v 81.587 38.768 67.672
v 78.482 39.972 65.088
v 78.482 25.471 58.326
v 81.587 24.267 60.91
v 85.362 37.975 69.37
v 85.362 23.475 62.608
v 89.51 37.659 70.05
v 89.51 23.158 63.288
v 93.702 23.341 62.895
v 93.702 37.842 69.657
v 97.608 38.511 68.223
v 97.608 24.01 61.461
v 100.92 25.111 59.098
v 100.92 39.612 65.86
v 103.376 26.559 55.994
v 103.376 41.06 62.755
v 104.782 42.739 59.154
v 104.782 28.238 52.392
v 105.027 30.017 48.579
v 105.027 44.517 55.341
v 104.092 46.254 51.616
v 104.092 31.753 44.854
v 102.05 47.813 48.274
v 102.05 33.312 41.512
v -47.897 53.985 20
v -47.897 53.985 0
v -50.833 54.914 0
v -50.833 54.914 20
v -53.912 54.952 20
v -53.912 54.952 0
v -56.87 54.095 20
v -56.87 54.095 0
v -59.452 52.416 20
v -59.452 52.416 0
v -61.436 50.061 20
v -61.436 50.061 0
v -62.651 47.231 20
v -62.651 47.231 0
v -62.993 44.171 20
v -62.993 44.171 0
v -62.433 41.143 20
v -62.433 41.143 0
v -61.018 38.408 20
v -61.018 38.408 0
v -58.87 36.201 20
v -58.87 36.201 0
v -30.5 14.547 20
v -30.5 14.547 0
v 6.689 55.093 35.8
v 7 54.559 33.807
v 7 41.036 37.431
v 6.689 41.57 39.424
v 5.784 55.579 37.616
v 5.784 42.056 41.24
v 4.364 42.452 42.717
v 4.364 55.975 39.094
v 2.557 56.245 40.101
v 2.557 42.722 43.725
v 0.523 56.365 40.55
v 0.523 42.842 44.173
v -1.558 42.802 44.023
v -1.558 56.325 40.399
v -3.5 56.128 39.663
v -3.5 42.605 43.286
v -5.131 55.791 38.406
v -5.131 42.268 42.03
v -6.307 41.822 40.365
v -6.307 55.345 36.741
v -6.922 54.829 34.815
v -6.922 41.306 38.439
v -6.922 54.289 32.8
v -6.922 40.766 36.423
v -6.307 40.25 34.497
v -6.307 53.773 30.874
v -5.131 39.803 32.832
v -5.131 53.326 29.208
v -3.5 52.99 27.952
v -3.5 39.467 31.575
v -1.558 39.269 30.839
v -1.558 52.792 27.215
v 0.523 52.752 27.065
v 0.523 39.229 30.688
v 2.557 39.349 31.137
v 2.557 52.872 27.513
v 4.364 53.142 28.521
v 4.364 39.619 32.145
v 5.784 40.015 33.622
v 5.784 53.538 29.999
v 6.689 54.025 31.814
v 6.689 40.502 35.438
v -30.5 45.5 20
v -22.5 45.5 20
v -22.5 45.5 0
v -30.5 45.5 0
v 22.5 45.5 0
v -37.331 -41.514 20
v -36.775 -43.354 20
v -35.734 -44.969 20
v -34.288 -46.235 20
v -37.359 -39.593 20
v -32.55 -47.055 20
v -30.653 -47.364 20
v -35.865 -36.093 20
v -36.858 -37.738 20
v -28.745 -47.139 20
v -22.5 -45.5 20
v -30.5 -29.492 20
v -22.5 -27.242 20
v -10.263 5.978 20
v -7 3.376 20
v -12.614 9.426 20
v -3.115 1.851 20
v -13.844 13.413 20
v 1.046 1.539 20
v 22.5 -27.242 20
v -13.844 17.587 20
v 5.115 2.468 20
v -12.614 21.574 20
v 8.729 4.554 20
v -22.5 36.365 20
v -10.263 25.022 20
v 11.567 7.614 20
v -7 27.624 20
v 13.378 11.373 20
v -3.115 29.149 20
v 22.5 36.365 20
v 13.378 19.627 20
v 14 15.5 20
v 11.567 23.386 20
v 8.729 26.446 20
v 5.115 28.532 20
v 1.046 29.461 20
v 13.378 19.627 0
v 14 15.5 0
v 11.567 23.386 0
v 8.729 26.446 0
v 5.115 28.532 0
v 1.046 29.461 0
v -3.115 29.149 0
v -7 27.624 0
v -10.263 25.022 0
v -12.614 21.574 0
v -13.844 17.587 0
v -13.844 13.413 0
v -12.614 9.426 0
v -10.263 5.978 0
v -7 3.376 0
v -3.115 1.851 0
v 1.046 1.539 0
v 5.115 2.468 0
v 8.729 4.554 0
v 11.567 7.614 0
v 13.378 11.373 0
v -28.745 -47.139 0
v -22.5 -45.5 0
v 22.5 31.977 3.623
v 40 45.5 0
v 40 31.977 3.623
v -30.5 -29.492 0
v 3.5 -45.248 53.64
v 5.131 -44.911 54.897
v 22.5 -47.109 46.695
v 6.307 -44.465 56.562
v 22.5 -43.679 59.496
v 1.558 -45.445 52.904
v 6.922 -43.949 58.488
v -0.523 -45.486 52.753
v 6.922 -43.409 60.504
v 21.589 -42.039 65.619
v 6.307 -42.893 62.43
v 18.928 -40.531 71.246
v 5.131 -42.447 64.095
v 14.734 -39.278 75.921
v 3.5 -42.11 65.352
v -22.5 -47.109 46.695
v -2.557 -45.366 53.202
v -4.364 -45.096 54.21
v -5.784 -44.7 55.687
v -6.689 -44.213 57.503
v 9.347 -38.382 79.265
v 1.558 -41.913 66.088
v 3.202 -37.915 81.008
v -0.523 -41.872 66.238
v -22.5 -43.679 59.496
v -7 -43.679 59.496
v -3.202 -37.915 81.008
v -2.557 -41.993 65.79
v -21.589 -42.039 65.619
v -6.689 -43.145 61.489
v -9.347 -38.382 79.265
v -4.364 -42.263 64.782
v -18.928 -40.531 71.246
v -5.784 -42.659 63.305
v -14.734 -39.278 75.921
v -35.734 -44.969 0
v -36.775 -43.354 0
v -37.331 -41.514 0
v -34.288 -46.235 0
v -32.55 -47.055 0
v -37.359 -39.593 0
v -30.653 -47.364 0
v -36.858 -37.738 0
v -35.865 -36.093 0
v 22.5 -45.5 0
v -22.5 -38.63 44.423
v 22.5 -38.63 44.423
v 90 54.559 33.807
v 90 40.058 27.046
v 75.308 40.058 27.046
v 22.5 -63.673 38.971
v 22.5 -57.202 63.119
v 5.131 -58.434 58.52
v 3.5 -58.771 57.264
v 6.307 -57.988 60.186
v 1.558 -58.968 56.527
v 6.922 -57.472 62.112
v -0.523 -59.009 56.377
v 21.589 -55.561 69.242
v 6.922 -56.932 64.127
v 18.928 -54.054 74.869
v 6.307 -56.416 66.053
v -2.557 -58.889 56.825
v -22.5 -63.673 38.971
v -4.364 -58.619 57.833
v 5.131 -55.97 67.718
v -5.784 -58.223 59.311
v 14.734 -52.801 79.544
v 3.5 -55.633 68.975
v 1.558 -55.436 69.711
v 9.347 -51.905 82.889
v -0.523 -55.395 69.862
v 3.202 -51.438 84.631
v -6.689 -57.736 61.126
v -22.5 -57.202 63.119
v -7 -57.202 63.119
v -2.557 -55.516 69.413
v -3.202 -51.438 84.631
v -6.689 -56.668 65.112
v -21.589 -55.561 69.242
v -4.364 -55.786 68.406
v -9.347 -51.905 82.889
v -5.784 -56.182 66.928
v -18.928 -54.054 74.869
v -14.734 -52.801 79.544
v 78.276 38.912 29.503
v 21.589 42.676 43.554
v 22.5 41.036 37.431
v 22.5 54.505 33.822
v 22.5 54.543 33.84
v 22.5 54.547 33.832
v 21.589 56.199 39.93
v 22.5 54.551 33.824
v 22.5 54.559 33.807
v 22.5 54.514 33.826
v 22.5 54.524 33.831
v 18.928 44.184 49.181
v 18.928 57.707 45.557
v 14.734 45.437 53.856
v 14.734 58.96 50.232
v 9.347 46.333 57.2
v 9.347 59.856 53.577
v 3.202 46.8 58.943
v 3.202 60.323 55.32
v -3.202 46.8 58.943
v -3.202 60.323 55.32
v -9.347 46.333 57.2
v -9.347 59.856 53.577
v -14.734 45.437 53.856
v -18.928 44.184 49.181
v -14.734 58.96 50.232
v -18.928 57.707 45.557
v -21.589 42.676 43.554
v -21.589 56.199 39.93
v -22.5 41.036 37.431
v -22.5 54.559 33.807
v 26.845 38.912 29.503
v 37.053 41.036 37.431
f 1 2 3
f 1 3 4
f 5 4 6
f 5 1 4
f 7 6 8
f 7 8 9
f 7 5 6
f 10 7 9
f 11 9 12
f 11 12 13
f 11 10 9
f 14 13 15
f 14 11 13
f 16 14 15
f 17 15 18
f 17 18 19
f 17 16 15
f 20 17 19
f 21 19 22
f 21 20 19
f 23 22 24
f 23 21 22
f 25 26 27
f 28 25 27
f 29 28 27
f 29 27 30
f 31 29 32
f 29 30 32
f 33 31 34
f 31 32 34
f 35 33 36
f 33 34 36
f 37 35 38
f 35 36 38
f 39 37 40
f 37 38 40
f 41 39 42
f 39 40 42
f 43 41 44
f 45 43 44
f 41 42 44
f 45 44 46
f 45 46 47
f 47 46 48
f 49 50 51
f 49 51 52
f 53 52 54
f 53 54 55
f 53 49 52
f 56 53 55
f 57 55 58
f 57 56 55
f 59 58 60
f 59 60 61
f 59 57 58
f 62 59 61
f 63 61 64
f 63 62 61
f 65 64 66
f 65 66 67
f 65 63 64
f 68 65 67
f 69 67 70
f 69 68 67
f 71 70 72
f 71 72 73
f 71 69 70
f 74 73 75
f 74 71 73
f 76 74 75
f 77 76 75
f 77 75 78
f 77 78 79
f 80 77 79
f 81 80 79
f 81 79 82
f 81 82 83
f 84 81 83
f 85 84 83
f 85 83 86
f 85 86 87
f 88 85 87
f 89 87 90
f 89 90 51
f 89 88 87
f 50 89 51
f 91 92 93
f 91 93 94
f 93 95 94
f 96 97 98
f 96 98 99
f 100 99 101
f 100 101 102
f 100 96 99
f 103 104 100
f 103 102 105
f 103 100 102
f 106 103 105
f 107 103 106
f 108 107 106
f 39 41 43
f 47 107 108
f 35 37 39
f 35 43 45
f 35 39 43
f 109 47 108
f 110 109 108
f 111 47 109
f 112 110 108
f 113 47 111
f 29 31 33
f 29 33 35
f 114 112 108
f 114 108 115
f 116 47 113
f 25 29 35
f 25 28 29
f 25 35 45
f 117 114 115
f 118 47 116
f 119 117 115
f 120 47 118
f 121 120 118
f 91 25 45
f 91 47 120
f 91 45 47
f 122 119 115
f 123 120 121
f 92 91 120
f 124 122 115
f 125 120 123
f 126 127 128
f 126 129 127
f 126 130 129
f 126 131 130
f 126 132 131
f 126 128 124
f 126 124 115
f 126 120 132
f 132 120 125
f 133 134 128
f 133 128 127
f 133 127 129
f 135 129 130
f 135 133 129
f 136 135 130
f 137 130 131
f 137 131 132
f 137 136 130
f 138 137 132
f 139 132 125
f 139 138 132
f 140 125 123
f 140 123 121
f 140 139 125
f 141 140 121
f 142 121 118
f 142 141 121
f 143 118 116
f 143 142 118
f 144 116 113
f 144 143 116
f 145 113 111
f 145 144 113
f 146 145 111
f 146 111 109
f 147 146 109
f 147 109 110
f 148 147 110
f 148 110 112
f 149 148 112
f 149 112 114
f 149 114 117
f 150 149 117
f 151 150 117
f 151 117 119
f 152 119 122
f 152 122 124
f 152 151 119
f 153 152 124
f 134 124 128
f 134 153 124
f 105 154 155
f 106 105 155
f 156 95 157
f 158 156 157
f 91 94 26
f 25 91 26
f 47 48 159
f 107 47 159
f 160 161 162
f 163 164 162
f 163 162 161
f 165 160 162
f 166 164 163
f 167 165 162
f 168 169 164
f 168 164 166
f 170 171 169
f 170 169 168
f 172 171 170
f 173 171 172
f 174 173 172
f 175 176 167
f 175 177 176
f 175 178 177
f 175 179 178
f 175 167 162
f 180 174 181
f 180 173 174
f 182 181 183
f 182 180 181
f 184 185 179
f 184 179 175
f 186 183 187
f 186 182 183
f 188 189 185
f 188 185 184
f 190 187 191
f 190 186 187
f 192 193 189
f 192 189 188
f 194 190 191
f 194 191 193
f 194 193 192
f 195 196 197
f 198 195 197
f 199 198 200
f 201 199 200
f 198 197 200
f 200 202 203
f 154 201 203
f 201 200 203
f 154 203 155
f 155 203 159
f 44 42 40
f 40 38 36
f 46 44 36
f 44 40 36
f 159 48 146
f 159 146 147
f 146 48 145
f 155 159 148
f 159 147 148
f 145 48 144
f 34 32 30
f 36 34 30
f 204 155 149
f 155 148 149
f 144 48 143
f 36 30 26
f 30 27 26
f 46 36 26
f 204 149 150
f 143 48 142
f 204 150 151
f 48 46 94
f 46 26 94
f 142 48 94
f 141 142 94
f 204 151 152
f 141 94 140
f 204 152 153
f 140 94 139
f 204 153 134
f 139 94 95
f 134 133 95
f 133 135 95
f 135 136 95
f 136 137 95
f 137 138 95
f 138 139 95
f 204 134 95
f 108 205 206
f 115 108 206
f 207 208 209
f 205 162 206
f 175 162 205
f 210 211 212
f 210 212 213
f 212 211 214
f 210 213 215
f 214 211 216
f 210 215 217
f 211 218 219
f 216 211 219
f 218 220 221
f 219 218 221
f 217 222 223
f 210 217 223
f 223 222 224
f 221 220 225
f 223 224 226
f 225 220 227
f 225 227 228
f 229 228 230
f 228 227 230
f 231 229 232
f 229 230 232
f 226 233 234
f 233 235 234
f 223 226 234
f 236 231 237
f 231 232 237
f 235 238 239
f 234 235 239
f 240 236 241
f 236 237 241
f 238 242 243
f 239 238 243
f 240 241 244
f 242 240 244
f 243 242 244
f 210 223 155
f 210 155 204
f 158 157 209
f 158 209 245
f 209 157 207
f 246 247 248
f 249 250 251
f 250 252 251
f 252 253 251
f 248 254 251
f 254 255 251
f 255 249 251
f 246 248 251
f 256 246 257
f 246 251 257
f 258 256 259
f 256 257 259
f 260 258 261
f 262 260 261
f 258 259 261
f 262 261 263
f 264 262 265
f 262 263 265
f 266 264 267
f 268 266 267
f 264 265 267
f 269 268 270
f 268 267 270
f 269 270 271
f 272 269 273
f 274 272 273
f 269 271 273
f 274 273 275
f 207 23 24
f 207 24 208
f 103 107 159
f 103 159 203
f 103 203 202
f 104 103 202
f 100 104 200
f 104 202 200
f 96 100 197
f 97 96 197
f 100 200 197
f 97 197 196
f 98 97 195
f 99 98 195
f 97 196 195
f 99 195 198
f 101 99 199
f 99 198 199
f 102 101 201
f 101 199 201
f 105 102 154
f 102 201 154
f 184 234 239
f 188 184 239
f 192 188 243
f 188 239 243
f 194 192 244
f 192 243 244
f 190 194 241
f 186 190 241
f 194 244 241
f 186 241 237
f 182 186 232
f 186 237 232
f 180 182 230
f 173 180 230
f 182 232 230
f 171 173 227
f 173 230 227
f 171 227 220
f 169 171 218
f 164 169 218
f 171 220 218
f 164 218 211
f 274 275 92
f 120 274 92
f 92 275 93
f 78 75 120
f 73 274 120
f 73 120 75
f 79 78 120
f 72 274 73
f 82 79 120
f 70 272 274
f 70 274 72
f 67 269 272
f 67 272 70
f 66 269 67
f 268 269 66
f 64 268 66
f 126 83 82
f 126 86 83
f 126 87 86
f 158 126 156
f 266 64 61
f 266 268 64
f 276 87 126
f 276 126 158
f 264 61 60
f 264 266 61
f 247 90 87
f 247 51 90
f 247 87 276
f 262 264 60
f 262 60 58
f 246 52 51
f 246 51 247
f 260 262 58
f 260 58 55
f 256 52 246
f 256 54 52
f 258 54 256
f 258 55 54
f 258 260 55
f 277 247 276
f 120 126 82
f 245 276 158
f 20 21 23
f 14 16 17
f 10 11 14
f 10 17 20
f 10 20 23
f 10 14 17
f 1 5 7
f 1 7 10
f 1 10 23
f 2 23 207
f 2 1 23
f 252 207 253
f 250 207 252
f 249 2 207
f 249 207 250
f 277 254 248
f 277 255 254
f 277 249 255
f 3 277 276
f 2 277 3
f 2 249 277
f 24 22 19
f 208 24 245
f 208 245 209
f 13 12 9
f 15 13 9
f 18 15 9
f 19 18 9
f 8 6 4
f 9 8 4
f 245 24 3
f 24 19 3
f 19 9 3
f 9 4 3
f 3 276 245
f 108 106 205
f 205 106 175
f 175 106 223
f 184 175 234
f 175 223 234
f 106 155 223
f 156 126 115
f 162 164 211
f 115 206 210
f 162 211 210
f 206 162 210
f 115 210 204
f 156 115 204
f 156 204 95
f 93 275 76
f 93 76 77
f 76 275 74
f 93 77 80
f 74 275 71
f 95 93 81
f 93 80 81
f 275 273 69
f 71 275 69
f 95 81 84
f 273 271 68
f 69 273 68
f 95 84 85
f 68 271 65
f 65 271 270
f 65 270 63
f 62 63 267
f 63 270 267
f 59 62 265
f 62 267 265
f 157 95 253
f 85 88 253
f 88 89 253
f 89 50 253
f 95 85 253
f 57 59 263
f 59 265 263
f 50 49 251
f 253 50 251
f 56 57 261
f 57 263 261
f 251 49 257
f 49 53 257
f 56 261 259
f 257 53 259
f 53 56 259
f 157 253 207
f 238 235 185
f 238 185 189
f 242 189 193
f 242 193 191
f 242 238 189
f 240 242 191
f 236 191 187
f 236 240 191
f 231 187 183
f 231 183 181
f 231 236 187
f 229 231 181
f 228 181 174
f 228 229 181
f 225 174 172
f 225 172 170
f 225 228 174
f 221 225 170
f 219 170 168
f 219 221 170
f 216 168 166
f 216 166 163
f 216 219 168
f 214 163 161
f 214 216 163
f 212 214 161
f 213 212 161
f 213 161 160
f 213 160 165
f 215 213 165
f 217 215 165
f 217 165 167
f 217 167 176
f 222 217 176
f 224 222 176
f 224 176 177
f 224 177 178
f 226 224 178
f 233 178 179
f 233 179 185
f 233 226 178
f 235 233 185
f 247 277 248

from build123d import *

# Parameters (mm, degrees)
F0_W       = 45
F0_H       = 91
F0_R       = 14
F1_DEPTH   = 20
F3_R       = 7
F4_DEPTH   = 14
F7_DEPTH   = 16
F9_W       = 45
F9_H       = 43
F10_DEPTH  = 25
F12_R      = 7
F13_DEPTH  = 14
F13_FACE_R = 7
F14_DEPTH  = 15.248435


with BuildPart() as f1:
    # F0 (on Top) → F1 (new body)
    with BuildSketch(Plane.XY):
        with BuildLine():
            Line((-30.5, 14.547375), (-30.5, 45.5))
            Line((-30.5, 45.5), (-47.897288, 53.984803))
            ThreePointArc((-47.897288, 53.984803), (-43.595549, 50.111615), (-42, 44.547375))
            ThreePointArc((-42, 44.547375), (-47.84382, 35.136212), (-58.870473, 36.200695))
            Line((-58.870473, 36.200695), (-30.5, 14.547375))
        make_face()
        with BuildLine():
            ThreePointArc((-42, 44.547375), (-43.595549, 50.111615), (-47.897288, 53.984803))
            ThreePointArc((-47.897288, 53.984803), (-61.435875, 50.061007), (-58.870473, 36.200695))
            ThreePointArc((-58.870473, 36.200695), (-47.84382, 35.136212), (-42, 44.547375))
        make_face()
        Rectangle(F0_W, F0_H)
        with Locations((0, 15.5)):
            Circle(F0_R, mode=Mode.SUBTRACT)
        with BuildLine():
            Line((-22.5, -45.5), (-22.5, 45.5))
            Line((-22.5, 45.5), (-30.5, 45.5))
            Line((-30.5, 45.5), (-30.5, 14.547375))
            Line((-30.5, 14.547375), (-30.5, -29.491527))
            Line((-30.5, -29.491527), (-30.5, -33.539497))
            ThreePointArc((-30.5, -33.539497), (-25.61168, -35.564305), (-23.586872, -40.452625))
            ThreePointArc((-23.586872, -40.452625), (-25.026188, -44.675033), (-28.744805, -47.139226))
            Line((-28.744805, -47.139226), (-22.5, -45.5))
        make_face()
        with BuildLine():
            ThreePointArc((-35.864791, -36.092538), (-36.310734, -44.197851), (-28.744805, -47.139226))
            ThreePointArc((-28.744805, -47.139226), (-25.026188, -44.675033), (-23.586872, -40.452625))
            ThreePointArc((-23.586872, -40.452625), (-25.61168, -35.564305), (-30.5, -33.539497))
            ThreePointArc((-30.5, -33.539497), (-33.470648, -34.210302), (-35.864791, -36.092538))
        make_face()
        with BuildLine():
            Line((-30.5, -29.491527), (-35.864791, -36.092538))
            ThreePointArc((-35.864791, -36.092538), (-33.470648, -34.210302), (-30.5, -33.539497))
            Line((-30.5, -33.539497), (-30.5, -29.491527))
        make_face()
    extrude(amount=F1_DEPTH)

    # F3 (on face) → F4 (join)
    with BuildSketch(Plane(origin=(0, 42.452078, -11.375), x_dir=(1, 0, 0), z_dir=(0, -0.965926, 0.258819))):
        with BuildLine():
            ThreePointArc((-22.5, 46.776267), (0, 24.276267), (22.5, 46.776267))
            ThreePointArc((22.5, 46.776267), (0, 69.276267), (-22.5, 46.776267))
        make_face()
        with Locations((0, 46.776267)):
            Circle(F3_R, mode=Mode.SUBTRACT)
        with BuildLine():
            Line((22.5, 11.776267), (22.5, 46.776267))
            ThreePointArc((22.5, 46.776267), (0, 24.276267), (-22.5, 46.776267))
            Line((-22.5, 46.776267), (-22.5, 11.776267))
            Line((-22.5, 11.776267), (22.5, 11.776267))
        make_face()
        Polygon((90, 46.776267), (22.5, 46.776267), (22.5, 11.776267), (40, 11.776267), align=None)
    extrude(amount=F4_DEPTH)

    # F6 (on face) → F7 (join)
    with BuildSketch(Plane(origin=(0, 57.763138, 26.935393), x_dir=(-1, 0, 0), z_dir=(0, 0.906308, 0.422618))):
        with BuildLine():
            ThreePointArc((-78.482193, 42.09701), (-75.954981, 37.634972), (-75.078428, 32.582425))
            ThreePointArc((-75.078428, 32.582425), (-85.312715, 18.359627), (-102.050159, 23.544855))
            Line((-102.050159, 23.544855), (-90.000033, 7.582504))
            Line((-90.000033, 7.582504), (-22.441784, 7.582504))
            Line((-22.441784, 7.582504), (-78.482193, 42.09701))
        make_face()
        with BuildLine():
            ThreePointArc((-102.050159, 23.544855), (-85.312715, 18.359627), (-75.078428, 32.582425))
            ThreePointArc((-75.078428, 32.582425), (-75.954981, 37.634972), (-78.482193, 42.09701))
            ThreePointArc((-78.482193, 42.09701), (-99.356405, 44.368821), (-102.050159, 23.544855))
        make_face()
    extrude(amount=-F7_DEPTH)

    # F9 (on face) → F10 (join)
    with BuildSketch(Plane(origin=(0, -37.373418, -17.427511), x_dir=(1, 0, 0), z_dir=(0, -0.906308, -0.422618))):
        with Locations((0, 40.729131)):
            Rectangle(F9_W, F9_H)
    extrude(amount=-F10_DEPTH)

    # F12 (on face) → F13 (join)
    with BuildSketch(Plane(origin=(0, -69.15014, 18.528724), x_dir=(-1, 0, 0), z_dir=(0, 0.965926, -0.258819))):
        with BuildLine():
            ThreePointArc((-22.5, 46.163645), (0, 23.663645), (22.5, 46.163645))
            ThreePointArc((22.5, 46.163645), (0, 68.663645), (-22.5, 46.163645))
        make_face()
        with Locations((0, 46.163645)):
            Circle(F12_R, mode=Mode.SUBTRACT)
        with BuildLine():
            Line((22.5, 21.163645), (22.5, 46.163645))
            ThreePointArc((22.5, 46.163645), (0, 23.663645), (-22.5, 46.163645))
            Line((-22.5, 46.163645), (-22.5, 21.163645))
            Line((-22.5, 21.163645), (22.5, 21.163645))
        make_face()
    extrude(amount=F13_DEPTH)

    # F13_face (on face) → F14 (cut)
    with BuildSketch(Plane(origin=(0, -42.917516, 62.338362), x_dir=(-1, 0, 0), z_dir=(0, 0.965926, -0.258819))):
        with BuildLine():
            ThreePointArc((22.5, -2.942718), (0, 19.557282), (-22.5, -2.942718))
            Line((-22.5, -2.942718), (-22.5, -16.195324))
            Line((-22.5, -16.195324), (22.5, -16.195324))
            Line((22.5, -16.195324), (22.5, -2.942718))
        make_face()
        with Locations((0, -2.942718)):
            Circle(F13_FACE_R, mode=Mode.SUBTRACT)
    extrude(amount=F14_DEPTH, mode=Mode.SUBTRACT)


solid = f1.part
